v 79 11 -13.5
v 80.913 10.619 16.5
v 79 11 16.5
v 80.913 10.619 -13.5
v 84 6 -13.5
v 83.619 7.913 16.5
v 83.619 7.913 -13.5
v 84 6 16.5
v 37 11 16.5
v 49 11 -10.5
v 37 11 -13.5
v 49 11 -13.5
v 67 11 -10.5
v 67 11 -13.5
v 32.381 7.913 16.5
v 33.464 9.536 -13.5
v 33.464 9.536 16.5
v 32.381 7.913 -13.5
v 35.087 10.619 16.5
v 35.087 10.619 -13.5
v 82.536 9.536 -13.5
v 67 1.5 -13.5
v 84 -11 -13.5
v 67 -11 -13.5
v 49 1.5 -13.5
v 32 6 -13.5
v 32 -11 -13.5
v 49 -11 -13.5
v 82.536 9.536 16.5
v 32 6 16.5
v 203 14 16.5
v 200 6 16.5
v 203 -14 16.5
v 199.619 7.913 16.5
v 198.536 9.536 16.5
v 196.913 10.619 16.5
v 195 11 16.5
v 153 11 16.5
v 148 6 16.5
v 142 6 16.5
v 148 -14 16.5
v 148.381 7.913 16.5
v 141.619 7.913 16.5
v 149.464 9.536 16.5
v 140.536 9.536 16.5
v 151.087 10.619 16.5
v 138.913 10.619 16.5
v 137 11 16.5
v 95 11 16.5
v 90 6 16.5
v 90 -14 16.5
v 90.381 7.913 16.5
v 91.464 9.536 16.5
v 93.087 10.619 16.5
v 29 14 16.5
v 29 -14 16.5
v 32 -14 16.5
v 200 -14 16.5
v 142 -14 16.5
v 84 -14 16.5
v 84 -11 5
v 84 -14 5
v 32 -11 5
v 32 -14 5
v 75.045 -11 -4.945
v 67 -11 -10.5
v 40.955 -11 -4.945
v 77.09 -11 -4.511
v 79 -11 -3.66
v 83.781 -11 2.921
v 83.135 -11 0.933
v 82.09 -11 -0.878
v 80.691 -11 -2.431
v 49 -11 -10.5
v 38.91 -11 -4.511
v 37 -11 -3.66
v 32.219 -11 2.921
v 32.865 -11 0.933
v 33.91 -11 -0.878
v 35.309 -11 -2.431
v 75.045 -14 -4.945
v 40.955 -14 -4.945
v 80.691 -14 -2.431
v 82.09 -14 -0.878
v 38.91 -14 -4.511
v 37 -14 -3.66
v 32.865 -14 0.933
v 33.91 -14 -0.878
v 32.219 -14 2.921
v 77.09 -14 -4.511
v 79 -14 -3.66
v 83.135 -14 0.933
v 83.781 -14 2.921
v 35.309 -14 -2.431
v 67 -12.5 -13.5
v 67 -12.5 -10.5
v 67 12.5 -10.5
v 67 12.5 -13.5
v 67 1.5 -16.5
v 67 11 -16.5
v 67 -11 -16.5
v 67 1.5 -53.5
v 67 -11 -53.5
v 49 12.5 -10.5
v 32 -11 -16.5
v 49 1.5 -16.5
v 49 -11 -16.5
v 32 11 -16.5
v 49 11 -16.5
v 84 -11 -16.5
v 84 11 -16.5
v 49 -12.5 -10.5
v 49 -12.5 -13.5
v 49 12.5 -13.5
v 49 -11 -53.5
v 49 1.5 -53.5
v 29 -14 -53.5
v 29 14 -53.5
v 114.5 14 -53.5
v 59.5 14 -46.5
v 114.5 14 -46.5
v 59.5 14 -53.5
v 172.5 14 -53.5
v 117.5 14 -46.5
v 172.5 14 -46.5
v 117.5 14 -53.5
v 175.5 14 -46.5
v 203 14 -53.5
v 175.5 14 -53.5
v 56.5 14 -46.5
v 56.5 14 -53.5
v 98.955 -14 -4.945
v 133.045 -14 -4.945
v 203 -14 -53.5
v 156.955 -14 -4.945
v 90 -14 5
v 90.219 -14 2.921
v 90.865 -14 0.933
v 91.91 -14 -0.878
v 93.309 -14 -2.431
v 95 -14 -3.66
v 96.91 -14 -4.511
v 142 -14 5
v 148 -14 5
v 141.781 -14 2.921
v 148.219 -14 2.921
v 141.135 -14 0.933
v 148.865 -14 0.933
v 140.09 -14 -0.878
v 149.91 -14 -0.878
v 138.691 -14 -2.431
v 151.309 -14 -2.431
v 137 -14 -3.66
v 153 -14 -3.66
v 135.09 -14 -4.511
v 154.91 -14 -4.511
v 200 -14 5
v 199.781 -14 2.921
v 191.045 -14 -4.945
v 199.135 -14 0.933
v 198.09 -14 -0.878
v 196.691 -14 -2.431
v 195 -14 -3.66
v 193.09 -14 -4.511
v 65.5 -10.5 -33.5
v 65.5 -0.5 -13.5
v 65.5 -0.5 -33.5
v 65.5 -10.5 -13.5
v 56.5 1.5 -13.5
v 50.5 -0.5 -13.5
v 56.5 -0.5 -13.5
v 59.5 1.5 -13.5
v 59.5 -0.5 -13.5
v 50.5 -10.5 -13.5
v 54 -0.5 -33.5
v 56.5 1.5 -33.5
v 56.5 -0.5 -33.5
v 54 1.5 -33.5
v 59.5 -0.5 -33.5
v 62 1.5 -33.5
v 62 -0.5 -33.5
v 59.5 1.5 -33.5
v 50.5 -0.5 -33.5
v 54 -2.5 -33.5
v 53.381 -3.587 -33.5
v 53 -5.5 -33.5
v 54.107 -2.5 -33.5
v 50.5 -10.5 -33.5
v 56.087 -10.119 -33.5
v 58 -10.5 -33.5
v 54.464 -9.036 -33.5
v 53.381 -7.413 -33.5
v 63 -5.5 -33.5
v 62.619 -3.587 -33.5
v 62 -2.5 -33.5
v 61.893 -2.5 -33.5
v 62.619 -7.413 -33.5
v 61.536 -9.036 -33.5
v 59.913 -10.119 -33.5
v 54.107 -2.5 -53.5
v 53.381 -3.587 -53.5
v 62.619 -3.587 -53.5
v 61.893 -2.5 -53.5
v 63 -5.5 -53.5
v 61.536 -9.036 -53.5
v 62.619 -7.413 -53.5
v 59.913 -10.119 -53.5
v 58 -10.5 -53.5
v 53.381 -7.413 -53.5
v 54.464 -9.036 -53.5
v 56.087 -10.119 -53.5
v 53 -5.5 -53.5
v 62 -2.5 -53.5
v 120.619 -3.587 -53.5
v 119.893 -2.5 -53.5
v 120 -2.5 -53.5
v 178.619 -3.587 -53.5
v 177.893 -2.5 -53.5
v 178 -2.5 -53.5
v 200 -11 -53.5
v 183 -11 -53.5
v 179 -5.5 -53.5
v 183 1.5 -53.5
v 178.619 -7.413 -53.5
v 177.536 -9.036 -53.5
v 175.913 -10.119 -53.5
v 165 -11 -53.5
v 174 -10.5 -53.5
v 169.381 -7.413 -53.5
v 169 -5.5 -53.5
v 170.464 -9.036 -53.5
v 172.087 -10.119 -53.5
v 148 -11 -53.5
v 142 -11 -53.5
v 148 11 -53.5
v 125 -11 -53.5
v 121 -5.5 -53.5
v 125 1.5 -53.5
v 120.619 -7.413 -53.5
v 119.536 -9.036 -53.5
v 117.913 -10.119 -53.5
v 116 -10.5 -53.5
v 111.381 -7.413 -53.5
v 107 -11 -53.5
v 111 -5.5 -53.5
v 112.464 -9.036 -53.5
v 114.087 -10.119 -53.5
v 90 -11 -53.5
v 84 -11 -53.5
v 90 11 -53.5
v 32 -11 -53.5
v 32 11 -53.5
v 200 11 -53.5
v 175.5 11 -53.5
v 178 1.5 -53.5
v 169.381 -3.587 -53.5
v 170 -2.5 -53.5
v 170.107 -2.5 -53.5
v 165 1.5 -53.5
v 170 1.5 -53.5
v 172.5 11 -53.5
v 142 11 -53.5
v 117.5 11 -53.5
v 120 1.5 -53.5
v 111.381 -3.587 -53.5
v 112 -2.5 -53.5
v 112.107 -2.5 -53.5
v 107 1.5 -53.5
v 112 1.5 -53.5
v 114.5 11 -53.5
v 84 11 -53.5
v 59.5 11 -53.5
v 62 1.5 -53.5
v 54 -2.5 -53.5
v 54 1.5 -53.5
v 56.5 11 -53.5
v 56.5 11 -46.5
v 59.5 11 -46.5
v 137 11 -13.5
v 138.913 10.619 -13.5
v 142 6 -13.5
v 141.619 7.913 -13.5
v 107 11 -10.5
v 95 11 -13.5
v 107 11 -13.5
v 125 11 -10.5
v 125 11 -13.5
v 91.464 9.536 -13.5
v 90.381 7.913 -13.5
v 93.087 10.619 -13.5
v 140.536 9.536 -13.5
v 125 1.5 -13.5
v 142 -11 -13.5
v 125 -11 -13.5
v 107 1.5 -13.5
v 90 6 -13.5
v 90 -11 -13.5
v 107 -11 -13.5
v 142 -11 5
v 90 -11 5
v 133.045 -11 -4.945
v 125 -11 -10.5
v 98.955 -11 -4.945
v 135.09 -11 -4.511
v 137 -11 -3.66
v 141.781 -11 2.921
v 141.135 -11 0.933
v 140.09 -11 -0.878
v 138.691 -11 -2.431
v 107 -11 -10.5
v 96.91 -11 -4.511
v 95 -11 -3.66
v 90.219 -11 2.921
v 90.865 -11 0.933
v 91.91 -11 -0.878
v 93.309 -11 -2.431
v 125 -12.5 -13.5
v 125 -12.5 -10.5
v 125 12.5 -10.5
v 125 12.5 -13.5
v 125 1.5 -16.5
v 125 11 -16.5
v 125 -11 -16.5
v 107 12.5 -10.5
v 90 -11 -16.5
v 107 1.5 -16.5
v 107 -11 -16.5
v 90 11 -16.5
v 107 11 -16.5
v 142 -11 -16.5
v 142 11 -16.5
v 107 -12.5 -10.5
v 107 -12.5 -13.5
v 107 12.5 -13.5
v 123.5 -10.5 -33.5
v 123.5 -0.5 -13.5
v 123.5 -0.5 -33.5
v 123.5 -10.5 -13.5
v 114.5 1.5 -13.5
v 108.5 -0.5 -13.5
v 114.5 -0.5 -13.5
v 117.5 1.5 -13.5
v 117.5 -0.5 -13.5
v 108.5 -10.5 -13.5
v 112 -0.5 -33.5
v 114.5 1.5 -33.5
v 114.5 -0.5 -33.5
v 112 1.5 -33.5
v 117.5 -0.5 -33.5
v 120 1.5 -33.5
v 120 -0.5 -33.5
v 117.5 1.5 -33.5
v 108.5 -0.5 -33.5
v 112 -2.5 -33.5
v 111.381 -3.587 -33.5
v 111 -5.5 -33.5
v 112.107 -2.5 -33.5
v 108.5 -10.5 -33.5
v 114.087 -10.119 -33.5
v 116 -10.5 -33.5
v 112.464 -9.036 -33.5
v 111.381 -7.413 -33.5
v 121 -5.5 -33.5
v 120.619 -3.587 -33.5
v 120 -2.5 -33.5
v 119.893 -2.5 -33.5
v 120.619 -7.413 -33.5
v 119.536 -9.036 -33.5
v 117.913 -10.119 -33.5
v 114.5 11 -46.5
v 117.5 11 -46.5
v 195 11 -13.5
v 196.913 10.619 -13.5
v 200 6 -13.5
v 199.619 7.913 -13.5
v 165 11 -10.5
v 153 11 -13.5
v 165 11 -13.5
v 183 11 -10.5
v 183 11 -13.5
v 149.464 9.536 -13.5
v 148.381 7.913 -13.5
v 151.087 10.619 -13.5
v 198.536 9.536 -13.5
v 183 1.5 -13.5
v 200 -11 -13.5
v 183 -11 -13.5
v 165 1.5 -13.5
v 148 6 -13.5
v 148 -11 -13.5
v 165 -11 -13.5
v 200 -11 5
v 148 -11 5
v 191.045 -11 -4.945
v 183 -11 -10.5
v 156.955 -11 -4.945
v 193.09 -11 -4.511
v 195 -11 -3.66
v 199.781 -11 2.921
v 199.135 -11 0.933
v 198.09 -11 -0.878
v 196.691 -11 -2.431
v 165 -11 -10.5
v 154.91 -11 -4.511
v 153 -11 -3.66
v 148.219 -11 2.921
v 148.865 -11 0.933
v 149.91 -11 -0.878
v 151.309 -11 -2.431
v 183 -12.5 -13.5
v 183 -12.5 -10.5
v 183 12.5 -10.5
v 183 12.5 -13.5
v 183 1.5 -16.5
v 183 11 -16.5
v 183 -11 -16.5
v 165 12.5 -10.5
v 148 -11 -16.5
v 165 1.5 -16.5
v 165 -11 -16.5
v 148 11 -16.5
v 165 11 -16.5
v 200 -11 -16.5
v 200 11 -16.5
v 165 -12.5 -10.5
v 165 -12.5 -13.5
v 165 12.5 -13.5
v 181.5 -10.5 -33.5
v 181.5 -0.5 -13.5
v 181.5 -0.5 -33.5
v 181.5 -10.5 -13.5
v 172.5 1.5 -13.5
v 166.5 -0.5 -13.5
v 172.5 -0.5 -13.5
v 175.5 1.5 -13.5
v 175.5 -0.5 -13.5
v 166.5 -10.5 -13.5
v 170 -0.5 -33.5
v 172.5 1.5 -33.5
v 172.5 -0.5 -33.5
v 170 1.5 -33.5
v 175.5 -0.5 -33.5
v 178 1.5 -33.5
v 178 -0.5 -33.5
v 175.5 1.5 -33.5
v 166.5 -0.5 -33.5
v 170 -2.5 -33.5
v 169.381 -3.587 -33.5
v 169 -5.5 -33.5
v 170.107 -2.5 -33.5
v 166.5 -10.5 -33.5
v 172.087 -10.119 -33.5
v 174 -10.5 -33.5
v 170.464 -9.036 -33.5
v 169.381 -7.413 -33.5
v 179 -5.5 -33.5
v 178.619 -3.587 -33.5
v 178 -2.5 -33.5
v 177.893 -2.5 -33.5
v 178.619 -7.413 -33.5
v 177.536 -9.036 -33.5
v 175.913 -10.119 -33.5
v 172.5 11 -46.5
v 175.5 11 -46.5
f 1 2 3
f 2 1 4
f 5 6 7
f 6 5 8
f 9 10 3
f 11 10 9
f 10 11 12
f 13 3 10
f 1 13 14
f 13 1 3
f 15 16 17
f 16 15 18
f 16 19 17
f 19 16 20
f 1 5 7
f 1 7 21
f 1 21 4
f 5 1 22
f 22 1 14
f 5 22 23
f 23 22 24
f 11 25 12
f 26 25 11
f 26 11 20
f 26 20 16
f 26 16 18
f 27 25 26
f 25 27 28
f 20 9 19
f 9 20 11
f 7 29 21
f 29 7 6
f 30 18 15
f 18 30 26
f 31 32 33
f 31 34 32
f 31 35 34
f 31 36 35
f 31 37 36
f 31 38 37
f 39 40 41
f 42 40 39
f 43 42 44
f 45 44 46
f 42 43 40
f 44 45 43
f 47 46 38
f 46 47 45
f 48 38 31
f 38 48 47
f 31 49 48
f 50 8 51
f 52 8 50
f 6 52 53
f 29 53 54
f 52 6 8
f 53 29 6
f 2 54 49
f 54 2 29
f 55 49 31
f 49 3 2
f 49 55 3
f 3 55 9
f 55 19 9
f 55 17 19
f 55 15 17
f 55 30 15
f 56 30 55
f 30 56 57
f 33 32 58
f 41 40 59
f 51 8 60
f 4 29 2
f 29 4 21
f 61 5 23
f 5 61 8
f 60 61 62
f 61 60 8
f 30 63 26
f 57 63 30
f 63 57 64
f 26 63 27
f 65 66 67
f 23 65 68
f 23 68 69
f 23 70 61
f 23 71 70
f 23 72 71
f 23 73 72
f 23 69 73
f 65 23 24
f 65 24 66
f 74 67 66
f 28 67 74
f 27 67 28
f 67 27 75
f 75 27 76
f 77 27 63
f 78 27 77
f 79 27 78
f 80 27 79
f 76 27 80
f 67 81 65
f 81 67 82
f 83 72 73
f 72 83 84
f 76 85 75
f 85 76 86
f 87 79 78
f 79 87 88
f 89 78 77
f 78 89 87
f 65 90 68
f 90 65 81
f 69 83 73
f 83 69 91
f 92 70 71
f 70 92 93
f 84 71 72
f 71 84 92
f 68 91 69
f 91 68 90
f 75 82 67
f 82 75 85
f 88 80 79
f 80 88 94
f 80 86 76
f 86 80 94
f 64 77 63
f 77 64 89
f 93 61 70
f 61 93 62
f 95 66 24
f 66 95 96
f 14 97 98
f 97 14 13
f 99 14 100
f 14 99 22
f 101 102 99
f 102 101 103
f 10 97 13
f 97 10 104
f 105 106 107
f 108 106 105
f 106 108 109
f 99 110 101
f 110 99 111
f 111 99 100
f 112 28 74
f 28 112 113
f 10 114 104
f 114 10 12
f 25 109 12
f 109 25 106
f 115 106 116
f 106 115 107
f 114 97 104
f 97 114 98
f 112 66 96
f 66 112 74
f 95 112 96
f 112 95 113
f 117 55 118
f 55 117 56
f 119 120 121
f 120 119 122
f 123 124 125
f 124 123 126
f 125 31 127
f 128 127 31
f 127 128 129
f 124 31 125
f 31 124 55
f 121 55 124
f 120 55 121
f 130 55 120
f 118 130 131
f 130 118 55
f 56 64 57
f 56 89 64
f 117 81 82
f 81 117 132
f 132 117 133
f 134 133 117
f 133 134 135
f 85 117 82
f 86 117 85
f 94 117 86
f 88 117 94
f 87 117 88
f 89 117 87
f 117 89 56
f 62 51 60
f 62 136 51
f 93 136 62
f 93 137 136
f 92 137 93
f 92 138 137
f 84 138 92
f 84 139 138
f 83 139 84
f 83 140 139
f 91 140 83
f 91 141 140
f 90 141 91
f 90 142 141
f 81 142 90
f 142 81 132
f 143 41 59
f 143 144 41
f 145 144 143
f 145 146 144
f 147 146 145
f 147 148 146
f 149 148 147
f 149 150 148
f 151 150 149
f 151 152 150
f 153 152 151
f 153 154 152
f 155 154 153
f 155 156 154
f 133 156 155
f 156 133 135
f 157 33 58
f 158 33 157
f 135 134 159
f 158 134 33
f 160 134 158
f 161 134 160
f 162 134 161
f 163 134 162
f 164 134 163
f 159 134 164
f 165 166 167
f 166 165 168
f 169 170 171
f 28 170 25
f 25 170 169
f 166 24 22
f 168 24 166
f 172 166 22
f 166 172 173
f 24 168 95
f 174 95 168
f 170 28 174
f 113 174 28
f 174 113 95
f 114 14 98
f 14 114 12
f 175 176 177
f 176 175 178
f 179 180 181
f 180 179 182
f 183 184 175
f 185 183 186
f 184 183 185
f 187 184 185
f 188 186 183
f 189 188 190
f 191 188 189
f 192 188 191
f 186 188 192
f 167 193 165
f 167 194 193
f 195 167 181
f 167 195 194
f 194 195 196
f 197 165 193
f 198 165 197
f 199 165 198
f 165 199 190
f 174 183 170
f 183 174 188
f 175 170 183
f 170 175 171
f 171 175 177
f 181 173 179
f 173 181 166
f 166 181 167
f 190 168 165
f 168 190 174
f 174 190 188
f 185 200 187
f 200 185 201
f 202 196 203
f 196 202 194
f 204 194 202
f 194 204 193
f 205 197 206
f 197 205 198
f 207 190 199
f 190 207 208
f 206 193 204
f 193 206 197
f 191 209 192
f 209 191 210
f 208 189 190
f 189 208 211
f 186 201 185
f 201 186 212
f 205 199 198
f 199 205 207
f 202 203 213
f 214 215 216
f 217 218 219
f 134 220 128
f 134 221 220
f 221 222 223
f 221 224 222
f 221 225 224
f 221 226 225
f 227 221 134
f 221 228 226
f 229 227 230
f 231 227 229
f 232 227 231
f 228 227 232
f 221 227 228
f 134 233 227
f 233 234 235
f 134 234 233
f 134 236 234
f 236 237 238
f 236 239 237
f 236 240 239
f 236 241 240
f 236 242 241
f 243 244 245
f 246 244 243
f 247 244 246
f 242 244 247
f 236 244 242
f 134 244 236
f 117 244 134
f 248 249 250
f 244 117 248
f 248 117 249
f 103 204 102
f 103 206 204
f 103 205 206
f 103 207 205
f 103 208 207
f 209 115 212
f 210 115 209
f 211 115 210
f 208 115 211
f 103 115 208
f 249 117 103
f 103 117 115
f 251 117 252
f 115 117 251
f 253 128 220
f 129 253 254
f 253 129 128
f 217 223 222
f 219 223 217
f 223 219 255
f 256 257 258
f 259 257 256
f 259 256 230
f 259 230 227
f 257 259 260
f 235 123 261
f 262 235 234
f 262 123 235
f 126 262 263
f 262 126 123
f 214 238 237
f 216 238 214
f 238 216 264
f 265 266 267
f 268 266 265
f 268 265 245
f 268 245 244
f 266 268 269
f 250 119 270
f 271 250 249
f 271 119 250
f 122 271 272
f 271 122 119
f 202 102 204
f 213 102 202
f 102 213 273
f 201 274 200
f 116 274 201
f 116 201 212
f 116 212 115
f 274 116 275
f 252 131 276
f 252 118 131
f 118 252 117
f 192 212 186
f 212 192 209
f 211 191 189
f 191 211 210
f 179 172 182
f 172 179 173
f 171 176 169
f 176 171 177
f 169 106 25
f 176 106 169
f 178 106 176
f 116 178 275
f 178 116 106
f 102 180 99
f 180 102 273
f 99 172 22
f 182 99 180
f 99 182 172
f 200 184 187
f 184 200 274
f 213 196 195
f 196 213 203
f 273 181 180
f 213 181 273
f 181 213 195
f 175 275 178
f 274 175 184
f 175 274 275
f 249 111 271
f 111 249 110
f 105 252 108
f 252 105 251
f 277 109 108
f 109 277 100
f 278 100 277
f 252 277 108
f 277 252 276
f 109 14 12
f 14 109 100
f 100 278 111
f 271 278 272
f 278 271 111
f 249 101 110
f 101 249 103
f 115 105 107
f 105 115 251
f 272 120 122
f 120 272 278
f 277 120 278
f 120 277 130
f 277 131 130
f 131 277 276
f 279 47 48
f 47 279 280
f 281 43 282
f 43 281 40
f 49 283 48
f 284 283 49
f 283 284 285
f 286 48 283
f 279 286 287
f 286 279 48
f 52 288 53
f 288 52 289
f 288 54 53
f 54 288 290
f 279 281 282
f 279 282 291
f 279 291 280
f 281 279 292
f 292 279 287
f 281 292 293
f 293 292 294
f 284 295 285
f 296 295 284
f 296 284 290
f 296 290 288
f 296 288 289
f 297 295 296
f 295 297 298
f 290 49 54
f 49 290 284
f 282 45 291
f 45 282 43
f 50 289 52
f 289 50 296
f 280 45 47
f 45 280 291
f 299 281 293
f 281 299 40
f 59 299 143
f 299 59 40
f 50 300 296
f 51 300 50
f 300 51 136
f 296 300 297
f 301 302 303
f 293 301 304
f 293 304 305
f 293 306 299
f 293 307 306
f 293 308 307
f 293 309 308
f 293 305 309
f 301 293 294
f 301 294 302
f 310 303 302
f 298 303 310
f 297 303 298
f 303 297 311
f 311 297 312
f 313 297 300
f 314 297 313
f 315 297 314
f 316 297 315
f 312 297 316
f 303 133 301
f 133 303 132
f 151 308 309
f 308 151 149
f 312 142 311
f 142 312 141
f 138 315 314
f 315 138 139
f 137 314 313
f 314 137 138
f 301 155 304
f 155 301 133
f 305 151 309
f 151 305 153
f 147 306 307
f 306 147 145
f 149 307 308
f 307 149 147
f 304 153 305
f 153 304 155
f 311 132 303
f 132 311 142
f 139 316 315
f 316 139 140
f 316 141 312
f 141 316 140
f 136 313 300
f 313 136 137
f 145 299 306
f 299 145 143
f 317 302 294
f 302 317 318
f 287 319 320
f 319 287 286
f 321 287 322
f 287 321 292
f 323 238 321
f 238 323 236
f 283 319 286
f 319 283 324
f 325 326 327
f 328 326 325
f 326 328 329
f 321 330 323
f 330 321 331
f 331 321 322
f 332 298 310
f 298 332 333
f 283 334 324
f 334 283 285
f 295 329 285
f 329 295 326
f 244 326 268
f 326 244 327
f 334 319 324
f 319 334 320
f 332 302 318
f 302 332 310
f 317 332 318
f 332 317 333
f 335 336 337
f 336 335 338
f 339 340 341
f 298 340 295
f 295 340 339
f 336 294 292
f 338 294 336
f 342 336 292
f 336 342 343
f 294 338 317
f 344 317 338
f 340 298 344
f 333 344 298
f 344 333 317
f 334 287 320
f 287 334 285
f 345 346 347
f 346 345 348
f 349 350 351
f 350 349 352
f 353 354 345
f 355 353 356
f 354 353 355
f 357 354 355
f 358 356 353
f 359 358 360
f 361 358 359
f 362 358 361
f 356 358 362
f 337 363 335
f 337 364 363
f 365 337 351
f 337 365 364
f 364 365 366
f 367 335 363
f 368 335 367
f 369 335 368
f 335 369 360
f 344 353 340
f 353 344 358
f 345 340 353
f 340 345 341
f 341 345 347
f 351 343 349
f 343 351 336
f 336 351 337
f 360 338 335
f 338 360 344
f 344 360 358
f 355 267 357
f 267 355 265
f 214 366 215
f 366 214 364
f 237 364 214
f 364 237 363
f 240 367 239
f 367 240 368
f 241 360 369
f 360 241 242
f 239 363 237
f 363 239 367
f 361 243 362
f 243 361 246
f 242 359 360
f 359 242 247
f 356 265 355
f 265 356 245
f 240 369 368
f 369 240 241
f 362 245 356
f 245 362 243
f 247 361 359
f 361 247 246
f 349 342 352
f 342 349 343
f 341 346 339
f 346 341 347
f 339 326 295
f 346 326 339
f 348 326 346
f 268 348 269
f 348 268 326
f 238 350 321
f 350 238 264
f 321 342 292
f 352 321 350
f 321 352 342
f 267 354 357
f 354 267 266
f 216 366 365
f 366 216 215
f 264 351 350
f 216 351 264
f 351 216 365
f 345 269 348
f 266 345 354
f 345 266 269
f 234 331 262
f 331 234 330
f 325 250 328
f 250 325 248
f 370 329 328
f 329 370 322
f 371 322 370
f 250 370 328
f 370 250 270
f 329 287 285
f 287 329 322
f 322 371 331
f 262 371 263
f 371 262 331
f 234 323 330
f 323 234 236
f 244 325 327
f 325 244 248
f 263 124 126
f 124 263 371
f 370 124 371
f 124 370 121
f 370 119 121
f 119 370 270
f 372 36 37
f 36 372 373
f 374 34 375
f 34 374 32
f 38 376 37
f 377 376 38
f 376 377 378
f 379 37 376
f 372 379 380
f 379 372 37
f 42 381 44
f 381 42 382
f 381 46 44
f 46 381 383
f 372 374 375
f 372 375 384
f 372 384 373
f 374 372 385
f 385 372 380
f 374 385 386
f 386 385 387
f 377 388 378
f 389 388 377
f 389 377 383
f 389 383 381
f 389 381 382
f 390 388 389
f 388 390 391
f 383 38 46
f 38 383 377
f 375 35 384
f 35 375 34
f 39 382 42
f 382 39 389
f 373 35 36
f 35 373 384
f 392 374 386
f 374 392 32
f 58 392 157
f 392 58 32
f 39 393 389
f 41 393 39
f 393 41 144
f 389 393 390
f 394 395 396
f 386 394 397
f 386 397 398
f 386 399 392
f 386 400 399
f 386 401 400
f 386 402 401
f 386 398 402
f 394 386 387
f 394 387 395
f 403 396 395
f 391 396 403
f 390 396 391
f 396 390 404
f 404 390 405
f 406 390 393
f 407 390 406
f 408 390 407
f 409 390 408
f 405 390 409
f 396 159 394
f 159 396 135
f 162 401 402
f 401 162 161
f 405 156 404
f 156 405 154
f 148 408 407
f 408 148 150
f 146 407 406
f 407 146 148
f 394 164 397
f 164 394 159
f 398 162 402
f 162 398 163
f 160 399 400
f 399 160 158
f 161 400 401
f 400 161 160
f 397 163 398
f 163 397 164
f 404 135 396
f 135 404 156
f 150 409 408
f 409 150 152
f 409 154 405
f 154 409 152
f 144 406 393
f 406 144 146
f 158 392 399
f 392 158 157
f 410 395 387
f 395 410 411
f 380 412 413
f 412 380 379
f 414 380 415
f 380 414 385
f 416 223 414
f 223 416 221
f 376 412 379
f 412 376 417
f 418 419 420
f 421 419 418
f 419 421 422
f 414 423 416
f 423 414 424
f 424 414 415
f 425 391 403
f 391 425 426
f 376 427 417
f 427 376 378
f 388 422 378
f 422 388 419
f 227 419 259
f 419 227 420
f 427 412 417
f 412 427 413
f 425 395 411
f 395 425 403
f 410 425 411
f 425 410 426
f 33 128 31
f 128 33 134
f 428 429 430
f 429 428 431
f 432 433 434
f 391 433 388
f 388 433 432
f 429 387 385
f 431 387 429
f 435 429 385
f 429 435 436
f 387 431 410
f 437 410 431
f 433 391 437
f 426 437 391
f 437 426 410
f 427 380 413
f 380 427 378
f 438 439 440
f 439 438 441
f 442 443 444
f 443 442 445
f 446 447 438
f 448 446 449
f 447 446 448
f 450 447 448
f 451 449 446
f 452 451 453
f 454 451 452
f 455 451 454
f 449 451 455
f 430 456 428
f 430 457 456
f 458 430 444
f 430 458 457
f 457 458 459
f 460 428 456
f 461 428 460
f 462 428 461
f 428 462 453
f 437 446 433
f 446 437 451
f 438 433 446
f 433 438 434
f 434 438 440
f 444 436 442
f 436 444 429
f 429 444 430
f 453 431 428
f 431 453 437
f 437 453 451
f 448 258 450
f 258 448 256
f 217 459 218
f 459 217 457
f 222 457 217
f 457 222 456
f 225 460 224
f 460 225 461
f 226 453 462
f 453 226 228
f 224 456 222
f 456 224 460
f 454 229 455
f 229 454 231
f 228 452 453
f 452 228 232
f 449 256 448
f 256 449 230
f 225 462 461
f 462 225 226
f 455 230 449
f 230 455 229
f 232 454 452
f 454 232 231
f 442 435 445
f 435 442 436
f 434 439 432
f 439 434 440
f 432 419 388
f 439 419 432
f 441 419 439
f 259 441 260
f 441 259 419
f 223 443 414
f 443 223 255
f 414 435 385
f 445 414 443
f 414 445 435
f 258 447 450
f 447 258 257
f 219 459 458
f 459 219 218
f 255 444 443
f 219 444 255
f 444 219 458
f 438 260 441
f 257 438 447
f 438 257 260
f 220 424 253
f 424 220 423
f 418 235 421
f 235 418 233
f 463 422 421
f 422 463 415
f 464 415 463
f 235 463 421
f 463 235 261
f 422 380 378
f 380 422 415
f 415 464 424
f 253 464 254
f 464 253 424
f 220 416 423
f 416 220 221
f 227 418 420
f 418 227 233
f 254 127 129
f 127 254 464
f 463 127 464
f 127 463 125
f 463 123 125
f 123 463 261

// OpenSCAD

number_of_handsets = 3;
handset_width = 52;  // default: 52
handset_depth = 22;  // default: 22
cradle_depth = 30;   // default: 30

wall_thickness = 3;

for(i=[1:number_of_handsets]) {
    translate([i*(handset_width+wall_thickness*2),0,0]) handset(i);
}

module handset() {
    handset_cradle();
    powersupply_support();
    cradle_base();
}

module handset_cradle(i) {
    
    difference() {
        union() {
            cube([handset_width+wall_thickness*2, handset_depth+wall_thickness*2, cradle_depth+wall_thickness], center=true);
        }
        union() {
            // rounded fillet of the backside of the cradle.
            hull() {
                translate([-handset_width/2+5,handset_depth/2-5,wall_thickness/2]) 
                        cylinder(r=5,h=cradle_depth, center=true);
                translate([handset_width/2-5,handset_depth/2-5,wall_thickness/2]) 
                        cylinder(r=5,h=cradle_depth, center=true);
            }
            translate([0,-2.5,wall_thickness/2]) cube([handset_width, handset_depth-5, cradle_depth], center=true);
            hull() {
                // 20mm lip at the bottom is not parameterized, nor is the 10mm radius of the knockout.
                rotate([90,0,0]) translate([-handset_width/2+10,-cradle_depth/2+20,handset_depth/2]) 
                        cylinder(r=10,h=handset_depth, center=true);
                rotate([90,0,0]) translate([handset_width/2-10,-cradle_depth/2+20,handset_depth/2]) 
                        cylinder(r=10,h=handset_depth, center=true);
            }
            translate([0,-handset_depth/2,20]) 
                        cube([handset_width,handset_depth,cradle_depth],center=true);
            translate([0,  5.5, -((cradle_depth+wall_thickness)/2)+wall_thickness]) cube([18,14,wall_thickness*2], center=true);
            translate([0, -5.5, -((cradle_depth+wall_thickness)/2)+wall_thickness]) cube([18,14,wall_thickness*2], center=true);
        }
    }
}

module powersupply_support(i) {
    difference() {
        union(){
            translate([0,-5.5,-20-((cradle_depth+wall_thickness)/2)+wall_thickness]) cube([18,14,40], center=true);
        }
        union() {
            translate([0, -5.5, -10-((cradle_depth+wall_thickness)/2)+wall_thickness]) cube([15,10,20], center=true);
            translate([0, -5.5, -20-((cradle_depth+wall_thickness)/2)+wall_thickness]) cylinder(r=5,h=40, center=true);
            translate([0, -5.5+5, -20-((cradle_depth+wall_thickness)/2)+wall_thickness]) cube([3,4,40],   center=true);
            translate([0, -5.5+5, -30-((cradle_depth+wall_thickness)/2)+wall_thickness]) cube([8,4,20],   center=true);
        }
    }
}

module cradle_base(i) {
    difference() {
        union() {
            translate([0,0,-20-((cradle_depth+wall_thickness)/2)+wall_thickness]) cube([handset_width+wall_thickness*2, handset_depth+wall_thickness*2, 40], center=true);
        }
        union() {
            translate([0,0,-20-((cradle_depth+wall_thickness)/2)+wall_thickness]) cube([handset_width, handset_depth, 40], center=true);
            translate([0,(handset_depth+wall_thickness*2)/2,-(cradle_depth+wall_thickness)/2-35]) cube([3,wall_thickness*2,10],center=true);
        }
    }
} 

